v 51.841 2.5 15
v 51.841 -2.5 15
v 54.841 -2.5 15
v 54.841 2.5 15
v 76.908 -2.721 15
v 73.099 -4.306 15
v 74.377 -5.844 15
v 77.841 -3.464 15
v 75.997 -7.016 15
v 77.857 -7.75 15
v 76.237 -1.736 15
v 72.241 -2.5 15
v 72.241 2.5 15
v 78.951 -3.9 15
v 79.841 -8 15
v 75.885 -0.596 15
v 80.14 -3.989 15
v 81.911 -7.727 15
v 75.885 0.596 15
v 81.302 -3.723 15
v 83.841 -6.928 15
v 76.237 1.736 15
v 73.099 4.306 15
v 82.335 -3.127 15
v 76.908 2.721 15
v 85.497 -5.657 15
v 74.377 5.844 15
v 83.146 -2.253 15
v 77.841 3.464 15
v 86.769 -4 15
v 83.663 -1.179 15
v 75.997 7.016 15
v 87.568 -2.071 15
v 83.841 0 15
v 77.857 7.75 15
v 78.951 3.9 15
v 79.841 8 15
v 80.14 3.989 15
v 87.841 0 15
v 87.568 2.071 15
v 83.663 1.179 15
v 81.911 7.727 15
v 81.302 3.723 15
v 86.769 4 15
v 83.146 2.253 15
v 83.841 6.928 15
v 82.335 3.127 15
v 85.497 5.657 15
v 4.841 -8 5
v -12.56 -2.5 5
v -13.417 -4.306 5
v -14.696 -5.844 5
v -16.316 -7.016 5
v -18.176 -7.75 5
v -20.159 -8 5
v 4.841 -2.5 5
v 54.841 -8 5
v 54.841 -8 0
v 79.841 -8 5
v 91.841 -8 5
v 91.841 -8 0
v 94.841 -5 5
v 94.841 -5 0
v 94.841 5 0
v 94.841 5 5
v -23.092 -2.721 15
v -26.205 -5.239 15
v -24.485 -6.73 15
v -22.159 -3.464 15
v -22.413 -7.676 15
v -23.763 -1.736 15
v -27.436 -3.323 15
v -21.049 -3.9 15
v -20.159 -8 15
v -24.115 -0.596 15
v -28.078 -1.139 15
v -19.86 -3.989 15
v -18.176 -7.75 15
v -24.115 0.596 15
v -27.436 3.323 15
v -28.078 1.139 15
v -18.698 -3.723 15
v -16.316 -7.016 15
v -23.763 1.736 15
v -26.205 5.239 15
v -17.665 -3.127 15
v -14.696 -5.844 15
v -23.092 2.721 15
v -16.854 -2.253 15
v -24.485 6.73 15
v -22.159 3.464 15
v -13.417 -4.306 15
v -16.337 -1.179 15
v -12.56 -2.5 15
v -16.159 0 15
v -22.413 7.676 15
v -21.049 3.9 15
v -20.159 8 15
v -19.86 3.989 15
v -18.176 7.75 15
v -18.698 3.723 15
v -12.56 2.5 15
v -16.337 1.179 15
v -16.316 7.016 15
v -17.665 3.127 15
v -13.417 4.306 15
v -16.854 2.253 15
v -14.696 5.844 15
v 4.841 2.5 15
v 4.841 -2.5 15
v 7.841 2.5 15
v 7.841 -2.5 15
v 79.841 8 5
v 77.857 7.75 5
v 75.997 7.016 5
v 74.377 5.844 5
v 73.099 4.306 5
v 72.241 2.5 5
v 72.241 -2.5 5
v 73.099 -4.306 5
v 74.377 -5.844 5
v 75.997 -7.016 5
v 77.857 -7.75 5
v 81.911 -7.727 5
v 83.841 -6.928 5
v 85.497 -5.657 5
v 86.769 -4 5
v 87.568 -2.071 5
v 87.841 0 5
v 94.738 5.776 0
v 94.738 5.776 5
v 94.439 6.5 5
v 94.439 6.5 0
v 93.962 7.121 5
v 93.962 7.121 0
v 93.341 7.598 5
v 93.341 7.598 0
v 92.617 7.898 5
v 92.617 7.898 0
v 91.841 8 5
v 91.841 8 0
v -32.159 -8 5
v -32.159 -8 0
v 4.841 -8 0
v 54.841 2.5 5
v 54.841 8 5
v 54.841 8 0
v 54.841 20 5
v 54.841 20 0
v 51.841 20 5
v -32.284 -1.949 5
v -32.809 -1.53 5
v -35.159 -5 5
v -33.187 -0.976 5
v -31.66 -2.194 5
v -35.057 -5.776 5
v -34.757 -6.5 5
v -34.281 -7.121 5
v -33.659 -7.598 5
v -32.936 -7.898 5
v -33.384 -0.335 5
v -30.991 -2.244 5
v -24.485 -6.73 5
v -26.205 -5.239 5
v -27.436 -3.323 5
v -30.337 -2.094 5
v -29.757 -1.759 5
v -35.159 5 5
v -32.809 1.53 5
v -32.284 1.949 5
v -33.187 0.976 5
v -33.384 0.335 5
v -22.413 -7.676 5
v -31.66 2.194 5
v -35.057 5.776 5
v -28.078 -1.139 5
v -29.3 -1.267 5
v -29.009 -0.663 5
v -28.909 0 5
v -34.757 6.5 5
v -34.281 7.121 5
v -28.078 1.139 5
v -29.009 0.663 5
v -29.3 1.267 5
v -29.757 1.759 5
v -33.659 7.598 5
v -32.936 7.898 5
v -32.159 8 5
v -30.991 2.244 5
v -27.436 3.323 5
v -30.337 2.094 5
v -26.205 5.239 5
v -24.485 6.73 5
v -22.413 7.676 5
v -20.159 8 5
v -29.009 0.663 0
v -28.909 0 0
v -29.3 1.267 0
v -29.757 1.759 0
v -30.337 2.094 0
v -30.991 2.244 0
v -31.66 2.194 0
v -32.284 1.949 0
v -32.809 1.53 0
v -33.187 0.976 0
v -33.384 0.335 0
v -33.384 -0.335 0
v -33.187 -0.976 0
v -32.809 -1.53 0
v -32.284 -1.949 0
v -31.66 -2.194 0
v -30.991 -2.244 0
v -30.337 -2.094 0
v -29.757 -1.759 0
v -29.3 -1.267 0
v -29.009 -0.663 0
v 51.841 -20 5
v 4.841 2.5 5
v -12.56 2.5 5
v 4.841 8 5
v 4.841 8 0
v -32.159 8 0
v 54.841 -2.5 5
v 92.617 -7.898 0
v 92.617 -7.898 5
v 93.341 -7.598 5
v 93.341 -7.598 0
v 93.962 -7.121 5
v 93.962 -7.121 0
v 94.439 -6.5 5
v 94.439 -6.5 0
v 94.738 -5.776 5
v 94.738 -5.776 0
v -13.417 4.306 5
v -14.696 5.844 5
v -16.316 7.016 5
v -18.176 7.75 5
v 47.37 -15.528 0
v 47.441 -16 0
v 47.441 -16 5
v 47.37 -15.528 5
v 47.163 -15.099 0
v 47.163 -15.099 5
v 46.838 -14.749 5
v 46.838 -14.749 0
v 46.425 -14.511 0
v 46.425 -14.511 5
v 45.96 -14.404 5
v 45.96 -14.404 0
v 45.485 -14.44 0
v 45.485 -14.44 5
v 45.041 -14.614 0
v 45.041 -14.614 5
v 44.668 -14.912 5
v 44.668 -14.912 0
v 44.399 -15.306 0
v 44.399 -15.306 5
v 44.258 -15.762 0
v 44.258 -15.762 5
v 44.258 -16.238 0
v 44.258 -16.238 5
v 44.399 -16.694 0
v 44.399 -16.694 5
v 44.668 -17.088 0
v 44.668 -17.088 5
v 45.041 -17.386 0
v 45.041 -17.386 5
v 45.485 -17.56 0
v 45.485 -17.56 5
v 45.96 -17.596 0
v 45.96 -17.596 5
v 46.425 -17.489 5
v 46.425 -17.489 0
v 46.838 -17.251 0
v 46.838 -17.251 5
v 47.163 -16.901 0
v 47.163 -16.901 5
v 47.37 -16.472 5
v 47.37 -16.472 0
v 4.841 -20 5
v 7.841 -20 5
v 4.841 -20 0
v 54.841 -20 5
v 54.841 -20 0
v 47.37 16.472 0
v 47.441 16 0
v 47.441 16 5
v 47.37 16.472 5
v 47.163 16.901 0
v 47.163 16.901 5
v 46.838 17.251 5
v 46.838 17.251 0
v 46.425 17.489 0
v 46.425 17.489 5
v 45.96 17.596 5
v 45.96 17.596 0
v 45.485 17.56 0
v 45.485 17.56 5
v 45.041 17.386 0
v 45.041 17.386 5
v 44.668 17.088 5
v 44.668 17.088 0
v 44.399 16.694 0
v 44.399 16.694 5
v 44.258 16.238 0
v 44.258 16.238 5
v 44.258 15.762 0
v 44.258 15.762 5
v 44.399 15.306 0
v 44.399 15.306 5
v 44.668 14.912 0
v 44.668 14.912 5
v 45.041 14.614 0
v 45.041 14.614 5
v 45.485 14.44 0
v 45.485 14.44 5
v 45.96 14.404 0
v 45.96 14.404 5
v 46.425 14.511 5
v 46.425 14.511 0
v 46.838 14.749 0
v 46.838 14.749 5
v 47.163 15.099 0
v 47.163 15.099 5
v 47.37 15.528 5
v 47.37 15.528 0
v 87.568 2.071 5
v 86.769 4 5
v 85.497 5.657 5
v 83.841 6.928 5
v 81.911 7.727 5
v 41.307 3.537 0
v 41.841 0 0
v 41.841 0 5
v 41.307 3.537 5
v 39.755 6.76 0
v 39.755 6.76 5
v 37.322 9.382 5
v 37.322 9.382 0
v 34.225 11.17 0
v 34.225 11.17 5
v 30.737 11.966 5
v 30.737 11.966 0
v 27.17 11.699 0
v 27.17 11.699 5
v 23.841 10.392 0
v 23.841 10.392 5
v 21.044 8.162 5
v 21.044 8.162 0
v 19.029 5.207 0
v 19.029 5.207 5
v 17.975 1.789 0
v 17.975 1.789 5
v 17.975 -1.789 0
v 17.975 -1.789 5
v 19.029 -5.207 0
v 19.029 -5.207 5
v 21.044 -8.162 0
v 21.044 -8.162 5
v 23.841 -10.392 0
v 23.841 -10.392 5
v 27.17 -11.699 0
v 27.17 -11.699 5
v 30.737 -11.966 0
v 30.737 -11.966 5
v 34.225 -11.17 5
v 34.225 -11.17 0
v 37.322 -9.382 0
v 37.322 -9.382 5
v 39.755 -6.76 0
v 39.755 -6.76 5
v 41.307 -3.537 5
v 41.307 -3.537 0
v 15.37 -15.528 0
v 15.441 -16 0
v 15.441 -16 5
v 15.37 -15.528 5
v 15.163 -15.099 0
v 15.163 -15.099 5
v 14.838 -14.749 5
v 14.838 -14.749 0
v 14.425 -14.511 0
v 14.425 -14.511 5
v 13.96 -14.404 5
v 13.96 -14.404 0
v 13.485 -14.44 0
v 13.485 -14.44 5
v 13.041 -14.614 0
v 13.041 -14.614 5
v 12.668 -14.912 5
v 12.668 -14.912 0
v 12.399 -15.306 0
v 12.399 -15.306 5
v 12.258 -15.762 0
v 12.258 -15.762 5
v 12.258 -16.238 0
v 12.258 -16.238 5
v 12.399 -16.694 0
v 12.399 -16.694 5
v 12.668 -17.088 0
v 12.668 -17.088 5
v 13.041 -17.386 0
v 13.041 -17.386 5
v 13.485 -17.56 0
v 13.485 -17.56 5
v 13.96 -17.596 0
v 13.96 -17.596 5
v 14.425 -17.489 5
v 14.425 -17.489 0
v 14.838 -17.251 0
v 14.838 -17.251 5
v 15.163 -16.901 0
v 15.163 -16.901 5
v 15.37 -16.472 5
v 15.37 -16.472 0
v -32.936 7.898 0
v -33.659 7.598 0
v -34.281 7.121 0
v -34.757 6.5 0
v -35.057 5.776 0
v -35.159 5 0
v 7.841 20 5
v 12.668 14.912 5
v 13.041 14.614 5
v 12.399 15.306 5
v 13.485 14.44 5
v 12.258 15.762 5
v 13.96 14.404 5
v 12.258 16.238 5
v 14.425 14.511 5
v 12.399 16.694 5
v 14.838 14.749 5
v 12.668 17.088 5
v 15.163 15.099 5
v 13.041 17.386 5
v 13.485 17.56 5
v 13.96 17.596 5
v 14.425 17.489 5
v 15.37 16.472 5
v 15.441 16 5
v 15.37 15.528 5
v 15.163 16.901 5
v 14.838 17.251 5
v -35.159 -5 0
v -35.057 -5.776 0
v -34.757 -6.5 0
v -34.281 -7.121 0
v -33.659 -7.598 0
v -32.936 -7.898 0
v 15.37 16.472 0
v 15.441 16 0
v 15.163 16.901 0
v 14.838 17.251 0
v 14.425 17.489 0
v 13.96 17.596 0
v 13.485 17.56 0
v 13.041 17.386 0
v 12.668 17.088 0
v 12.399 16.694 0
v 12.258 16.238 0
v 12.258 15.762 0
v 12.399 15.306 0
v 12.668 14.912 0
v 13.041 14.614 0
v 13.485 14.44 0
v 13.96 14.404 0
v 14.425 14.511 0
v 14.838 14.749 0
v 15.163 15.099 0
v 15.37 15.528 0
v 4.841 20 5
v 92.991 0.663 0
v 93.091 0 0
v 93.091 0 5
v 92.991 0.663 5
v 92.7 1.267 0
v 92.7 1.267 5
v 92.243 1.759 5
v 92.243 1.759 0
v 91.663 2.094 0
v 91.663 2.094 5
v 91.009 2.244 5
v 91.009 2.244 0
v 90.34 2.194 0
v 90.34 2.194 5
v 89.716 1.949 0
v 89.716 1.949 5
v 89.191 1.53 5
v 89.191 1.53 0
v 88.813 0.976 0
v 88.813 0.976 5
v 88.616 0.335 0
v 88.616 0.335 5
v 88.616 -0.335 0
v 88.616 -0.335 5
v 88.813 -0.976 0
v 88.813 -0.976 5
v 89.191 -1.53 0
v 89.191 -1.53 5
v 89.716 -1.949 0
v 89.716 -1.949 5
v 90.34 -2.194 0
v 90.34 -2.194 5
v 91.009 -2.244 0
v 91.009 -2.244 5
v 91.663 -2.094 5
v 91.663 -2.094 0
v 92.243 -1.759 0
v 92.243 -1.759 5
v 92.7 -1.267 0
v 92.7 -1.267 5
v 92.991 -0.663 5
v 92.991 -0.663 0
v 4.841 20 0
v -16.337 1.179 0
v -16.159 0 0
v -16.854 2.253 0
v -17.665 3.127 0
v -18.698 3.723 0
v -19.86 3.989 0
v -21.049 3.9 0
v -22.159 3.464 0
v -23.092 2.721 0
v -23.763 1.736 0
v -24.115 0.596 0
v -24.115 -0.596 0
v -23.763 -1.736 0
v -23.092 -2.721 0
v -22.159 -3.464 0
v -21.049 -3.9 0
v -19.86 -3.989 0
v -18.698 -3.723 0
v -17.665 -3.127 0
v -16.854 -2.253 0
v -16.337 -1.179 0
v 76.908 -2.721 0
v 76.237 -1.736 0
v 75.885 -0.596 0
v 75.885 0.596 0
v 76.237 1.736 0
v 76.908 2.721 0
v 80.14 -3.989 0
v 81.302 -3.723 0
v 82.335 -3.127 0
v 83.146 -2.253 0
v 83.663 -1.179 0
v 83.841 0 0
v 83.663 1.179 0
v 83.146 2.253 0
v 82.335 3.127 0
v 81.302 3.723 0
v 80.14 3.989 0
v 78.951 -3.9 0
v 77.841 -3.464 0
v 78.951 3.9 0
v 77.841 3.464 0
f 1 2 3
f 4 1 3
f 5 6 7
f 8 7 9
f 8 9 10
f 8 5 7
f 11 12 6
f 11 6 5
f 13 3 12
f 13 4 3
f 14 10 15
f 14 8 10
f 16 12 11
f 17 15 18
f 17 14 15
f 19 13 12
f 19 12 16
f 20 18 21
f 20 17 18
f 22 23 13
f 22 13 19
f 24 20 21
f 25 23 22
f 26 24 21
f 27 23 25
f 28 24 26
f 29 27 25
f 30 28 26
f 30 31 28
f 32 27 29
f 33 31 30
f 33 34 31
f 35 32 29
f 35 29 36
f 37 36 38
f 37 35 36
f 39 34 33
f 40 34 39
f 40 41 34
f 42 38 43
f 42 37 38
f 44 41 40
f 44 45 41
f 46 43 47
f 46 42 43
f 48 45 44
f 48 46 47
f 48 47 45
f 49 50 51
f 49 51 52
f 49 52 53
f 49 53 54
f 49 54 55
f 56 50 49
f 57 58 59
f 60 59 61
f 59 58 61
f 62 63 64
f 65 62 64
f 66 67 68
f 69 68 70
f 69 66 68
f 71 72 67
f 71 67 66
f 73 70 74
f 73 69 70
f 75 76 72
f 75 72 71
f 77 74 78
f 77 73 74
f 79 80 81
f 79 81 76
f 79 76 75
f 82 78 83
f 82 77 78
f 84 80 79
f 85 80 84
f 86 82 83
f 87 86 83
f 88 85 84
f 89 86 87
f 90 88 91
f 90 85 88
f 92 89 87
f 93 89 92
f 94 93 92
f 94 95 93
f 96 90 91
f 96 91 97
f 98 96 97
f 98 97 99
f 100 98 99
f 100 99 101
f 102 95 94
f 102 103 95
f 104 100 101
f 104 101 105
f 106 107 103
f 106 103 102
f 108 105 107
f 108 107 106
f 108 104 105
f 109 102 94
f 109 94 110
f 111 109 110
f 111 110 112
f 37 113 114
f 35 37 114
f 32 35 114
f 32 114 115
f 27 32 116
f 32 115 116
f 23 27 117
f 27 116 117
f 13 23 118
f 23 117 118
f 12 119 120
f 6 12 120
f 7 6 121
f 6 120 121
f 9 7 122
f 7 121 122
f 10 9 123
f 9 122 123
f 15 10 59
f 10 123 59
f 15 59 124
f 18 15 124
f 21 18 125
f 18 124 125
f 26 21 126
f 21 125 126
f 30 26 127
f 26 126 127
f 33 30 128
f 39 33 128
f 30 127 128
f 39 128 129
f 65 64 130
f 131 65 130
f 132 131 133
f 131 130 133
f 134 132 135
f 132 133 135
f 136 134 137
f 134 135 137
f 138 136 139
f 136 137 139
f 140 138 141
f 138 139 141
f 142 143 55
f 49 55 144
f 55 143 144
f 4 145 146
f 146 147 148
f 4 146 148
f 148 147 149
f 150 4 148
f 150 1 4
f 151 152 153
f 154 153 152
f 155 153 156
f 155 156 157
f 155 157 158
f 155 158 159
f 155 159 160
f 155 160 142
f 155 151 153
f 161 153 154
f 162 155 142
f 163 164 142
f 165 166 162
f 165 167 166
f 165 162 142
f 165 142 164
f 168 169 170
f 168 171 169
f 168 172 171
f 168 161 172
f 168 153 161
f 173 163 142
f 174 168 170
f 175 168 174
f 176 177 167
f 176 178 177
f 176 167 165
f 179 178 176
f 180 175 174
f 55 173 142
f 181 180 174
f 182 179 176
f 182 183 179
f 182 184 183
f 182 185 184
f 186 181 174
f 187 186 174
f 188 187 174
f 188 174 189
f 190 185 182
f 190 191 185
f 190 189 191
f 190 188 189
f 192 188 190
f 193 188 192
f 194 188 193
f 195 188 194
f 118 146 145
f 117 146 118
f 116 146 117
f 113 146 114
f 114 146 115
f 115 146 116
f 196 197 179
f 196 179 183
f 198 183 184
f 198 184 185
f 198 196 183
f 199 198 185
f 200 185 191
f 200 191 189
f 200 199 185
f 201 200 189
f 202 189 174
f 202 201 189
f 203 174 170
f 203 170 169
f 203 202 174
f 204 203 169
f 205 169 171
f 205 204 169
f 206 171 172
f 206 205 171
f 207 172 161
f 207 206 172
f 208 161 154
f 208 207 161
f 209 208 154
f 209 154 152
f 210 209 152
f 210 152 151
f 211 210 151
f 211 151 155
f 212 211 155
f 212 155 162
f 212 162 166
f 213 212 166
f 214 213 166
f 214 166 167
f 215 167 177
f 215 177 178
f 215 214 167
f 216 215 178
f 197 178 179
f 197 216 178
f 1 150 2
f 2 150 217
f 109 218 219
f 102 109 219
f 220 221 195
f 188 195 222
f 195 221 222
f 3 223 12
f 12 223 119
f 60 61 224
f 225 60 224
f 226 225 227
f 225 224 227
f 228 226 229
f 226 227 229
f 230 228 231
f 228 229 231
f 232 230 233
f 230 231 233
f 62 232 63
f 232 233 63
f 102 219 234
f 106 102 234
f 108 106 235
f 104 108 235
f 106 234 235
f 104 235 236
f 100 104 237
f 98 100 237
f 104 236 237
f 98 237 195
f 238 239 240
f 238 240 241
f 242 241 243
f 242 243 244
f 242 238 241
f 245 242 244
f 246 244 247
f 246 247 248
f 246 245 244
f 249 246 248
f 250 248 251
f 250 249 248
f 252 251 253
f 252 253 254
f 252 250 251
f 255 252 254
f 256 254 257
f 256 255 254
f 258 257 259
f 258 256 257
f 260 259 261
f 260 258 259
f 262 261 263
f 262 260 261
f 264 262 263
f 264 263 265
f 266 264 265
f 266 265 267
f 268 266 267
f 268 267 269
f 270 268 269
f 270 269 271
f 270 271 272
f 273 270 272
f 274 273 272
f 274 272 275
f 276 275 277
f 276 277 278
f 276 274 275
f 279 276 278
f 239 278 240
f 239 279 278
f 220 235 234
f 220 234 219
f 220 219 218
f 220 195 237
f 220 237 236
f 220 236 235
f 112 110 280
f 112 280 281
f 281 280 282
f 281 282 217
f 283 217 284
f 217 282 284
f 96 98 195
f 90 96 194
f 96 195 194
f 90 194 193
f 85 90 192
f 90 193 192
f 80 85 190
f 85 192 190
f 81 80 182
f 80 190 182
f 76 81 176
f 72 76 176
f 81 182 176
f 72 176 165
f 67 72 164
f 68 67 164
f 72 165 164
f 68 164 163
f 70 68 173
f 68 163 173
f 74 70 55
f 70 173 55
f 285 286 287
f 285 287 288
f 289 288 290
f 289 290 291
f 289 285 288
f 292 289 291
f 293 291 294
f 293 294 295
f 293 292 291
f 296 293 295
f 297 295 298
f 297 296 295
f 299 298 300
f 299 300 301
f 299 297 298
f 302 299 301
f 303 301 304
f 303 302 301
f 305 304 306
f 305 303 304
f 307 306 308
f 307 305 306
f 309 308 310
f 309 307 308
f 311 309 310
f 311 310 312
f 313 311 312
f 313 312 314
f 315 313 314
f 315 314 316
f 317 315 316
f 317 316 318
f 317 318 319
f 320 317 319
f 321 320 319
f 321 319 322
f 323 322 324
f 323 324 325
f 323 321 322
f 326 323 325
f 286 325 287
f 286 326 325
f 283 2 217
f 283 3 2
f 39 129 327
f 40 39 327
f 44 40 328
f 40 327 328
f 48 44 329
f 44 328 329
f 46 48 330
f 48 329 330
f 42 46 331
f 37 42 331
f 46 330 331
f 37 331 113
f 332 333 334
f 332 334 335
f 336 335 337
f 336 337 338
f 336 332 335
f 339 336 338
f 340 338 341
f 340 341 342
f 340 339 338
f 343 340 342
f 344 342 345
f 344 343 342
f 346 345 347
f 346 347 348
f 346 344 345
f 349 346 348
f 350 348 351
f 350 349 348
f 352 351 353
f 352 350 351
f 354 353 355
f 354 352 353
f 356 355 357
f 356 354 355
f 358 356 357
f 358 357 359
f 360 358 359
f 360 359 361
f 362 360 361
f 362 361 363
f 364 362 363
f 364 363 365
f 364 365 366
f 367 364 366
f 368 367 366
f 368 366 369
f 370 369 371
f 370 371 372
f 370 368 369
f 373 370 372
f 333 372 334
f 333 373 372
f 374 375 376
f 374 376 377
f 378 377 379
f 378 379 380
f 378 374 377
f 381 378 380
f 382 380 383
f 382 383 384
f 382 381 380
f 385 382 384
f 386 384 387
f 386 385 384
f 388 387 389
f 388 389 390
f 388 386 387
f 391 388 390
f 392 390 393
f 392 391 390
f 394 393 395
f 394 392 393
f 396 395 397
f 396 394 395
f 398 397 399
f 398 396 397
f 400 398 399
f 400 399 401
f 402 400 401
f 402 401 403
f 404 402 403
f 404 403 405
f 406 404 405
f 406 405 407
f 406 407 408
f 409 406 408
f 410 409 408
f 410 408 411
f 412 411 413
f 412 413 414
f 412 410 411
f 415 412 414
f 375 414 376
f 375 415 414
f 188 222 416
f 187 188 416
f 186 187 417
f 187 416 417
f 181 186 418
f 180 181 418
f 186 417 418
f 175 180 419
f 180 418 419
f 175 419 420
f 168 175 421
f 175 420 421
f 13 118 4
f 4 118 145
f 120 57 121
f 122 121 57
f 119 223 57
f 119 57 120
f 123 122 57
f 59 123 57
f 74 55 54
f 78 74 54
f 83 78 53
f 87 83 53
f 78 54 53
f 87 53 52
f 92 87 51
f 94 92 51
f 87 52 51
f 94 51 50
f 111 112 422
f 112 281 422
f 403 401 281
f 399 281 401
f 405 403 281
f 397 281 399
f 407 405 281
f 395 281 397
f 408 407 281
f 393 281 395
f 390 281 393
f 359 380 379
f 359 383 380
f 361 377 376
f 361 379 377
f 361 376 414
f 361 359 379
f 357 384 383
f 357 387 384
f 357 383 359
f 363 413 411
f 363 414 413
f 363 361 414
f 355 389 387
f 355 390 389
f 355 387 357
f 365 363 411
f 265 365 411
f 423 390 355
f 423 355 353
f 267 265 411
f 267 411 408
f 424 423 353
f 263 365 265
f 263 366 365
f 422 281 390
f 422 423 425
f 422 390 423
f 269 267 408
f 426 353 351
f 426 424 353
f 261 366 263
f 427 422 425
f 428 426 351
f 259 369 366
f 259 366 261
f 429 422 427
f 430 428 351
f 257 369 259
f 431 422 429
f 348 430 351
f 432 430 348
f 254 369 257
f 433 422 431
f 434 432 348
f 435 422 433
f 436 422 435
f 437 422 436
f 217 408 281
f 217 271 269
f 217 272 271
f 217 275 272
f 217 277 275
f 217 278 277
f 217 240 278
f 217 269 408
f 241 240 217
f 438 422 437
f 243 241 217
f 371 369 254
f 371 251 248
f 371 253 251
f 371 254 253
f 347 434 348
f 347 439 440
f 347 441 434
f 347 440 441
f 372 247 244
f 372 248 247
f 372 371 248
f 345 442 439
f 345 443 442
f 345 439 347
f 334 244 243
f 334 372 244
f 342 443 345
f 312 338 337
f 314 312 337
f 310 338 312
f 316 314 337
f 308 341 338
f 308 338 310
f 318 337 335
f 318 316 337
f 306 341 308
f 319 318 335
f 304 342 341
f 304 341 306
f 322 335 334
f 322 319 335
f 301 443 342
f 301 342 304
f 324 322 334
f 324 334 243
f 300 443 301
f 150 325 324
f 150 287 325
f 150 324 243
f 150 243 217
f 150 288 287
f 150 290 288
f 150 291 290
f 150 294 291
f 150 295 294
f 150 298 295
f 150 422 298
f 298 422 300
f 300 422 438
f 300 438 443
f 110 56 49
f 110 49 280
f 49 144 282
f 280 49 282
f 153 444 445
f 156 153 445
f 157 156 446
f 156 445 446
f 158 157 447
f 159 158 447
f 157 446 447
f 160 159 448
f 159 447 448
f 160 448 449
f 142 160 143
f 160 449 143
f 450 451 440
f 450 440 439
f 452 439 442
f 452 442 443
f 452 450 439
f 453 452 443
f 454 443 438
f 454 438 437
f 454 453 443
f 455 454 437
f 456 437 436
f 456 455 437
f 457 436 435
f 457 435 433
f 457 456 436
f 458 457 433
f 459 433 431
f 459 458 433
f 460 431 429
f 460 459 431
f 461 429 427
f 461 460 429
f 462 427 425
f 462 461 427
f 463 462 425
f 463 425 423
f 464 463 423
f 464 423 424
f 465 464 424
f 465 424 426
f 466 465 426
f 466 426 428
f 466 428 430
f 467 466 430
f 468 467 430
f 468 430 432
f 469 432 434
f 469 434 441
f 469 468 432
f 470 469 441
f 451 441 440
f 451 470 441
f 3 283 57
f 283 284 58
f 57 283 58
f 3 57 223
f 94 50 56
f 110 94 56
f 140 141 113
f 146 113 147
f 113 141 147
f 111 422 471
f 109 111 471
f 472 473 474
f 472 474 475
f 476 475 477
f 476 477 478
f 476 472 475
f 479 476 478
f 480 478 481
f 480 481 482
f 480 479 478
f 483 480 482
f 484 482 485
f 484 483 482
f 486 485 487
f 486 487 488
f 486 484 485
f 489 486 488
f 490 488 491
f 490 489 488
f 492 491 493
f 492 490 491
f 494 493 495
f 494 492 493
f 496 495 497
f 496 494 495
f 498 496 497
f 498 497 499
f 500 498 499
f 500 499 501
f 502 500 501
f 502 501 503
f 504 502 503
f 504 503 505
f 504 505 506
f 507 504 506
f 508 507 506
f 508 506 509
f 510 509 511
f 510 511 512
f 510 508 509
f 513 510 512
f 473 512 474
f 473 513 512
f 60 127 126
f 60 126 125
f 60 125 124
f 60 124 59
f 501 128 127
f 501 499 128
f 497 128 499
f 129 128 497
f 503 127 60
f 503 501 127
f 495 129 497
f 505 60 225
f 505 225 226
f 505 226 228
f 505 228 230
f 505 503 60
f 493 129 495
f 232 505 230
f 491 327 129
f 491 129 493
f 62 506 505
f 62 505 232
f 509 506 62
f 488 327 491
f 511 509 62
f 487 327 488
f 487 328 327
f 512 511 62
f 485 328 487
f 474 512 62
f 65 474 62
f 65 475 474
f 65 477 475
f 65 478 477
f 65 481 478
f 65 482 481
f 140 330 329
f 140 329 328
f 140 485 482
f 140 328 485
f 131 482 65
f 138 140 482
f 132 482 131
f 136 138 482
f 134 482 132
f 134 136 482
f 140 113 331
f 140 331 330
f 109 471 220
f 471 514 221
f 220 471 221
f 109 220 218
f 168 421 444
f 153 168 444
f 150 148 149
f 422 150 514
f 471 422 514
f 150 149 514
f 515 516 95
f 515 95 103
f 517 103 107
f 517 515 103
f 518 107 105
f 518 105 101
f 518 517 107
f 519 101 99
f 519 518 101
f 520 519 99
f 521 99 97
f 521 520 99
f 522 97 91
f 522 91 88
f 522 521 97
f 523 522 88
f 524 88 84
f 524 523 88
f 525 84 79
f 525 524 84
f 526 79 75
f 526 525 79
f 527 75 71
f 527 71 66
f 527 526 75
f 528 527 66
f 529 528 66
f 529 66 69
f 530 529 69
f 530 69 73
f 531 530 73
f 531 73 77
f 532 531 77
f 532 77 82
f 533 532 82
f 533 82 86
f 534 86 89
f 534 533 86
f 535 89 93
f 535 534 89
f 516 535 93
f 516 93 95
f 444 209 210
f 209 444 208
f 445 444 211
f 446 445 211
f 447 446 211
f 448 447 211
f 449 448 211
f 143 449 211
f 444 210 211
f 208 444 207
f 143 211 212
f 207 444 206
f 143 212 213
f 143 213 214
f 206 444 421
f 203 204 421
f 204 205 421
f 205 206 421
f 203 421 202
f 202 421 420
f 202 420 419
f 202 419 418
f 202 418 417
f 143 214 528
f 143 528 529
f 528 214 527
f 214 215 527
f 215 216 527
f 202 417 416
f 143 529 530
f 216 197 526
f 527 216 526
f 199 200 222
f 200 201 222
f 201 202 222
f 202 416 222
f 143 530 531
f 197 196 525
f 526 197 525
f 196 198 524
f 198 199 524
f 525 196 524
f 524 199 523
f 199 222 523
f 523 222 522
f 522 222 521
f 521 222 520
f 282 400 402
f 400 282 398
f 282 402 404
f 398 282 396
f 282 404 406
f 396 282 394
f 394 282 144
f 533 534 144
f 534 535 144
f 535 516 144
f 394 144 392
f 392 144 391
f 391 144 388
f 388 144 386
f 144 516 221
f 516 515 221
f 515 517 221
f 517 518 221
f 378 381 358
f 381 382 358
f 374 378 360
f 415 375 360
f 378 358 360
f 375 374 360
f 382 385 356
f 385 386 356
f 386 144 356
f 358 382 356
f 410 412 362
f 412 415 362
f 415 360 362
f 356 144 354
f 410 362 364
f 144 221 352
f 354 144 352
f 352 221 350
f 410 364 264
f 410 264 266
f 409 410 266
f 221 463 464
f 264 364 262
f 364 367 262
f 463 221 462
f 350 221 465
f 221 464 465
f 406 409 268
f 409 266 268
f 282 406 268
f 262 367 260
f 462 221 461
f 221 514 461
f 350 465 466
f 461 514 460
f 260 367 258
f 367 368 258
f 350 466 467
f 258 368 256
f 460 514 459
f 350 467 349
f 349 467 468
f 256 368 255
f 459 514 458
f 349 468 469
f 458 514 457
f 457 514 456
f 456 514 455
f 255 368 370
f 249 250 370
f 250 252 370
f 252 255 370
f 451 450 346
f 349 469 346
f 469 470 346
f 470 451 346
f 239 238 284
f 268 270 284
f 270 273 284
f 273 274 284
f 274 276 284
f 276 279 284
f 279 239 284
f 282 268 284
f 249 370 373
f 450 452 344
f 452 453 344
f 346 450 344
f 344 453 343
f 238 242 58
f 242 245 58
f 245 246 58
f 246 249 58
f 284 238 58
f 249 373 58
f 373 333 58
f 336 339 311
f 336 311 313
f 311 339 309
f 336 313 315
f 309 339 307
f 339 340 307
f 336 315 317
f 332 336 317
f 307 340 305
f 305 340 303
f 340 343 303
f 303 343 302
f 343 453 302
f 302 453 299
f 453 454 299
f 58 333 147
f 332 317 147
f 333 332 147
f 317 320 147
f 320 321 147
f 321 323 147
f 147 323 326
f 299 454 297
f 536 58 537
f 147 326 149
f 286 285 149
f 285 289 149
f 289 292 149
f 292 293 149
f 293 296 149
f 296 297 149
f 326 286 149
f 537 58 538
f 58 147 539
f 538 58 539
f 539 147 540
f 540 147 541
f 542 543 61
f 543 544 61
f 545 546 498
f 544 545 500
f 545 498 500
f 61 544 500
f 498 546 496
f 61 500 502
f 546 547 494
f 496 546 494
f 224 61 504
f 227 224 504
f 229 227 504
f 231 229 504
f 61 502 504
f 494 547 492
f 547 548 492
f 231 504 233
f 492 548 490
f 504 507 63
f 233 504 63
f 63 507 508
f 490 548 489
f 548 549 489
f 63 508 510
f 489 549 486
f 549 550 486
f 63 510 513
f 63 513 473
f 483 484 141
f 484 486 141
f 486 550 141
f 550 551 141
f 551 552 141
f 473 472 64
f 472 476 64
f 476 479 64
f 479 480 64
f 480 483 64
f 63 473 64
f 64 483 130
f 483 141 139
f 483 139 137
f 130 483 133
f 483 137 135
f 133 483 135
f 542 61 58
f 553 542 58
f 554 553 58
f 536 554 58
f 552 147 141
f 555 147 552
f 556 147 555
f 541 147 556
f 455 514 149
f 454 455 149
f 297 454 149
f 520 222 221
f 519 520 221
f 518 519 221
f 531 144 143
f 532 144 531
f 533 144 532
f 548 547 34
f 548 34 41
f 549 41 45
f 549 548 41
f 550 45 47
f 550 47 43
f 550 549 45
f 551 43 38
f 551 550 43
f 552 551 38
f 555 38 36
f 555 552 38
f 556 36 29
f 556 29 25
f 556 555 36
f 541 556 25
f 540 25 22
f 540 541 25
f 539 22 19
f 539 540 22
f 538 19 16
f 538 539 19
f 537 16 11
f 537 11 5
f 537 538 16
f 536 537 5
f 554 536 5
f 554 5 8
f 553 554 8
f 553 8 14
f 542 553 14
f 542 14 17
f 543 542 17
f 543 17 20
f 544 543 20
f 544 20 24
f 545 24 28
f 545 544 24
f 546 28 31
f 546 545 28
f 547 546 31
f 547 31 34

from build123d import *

# Parameters (mm, degrees)
F1_DEPTH = 5
F0_R     = 2.25
F0_W     = 44
F0_H     = 40
F0_R_2   = 1.6
F0_R_3   = 12
F0_R_4   = 4
F2_DEPTH = 15
F3_SIZE2 = 10
F3_SIZE  = 17.5
F4_SIZE2 = 10
F4_SIZE  = 17.5


with BuildPart() as f1:
    # F0 (on Top) → F1 (new body)
    with BuildSketch(Plane.XY):
        with BuildLine():
            Line((4.8406173328, -2.5), (-12.5600405904, -2.5))
            ThreePointArc((-12.5600405904, -2.5), (-15.4689669073, -6.4807406984), (-20.1593826672, -8))
            Line((-20.1593826672, -8), (4.8406173328, -8))
            Line((4.8406173328, -8), (4.8406173328, -2.5))
        make_face()
    extrude(amount=F1_DEPTH)



with BuildPart() as f1b:
    # F0 (on Top) → F1, piece 2 (new body)
    with BuildSketch(Plane.XY):
        with BuildLine():
            ThreePointArc((-20.1593826672, 8), (-15.4689669073, 6.4807406984), (-12.5600405904, 2.5))
            Line((-12.5600405904, 2.5), (4.8406173328, 2.5))
            Line((4.8406173328, 2.5), (4.8406173328, 8))
            Line((4.8406173328, 8), (-20.1593826672, 8))
        make_face()
    extrude(amount=F1_DEPTH)


with BuildPart() as f1c:
    # F0 (on Top) → F1, piece 3 (new body)
    with BuildSketch(Plane.XY):
        with BuildLine():
            ThreePointArc((-20.1593826672, -8), (-28.1593826672, 0), (-20.1593826672, 8))
            Line((-20.1593826672, 8), (-32.1593826672, 8))
            ThreePointArc((-32.1593826672, 8), (-34.2807030107, 7.1213203436), (-35.1593826672, 5))
            Line((-35.1593826672, 5), (-35.1593826672, -5))
            ThreePointArc((-35.1593826672, -5), (-34.2807030107, -7.1213203436), (-32.1593826672, -8))
            Line((-32.1593826672, -8), (-20.1593826672, -8))
        make_face()
        with Locations((-31.1593826672, 0)):
            Circle(F0_R, mode=Mode.SUBTRACT)
    extrude(amount=F1_DEPTH)


with BuildPart() as f1d:
    # F0 (on Top) → F1, piece 4 (new body)
    with BuildSketch(Plane.XY):
        with BuildLine():
            Line((91.8406173328, 8), (79.8406173328, 8))
            ThreePointArc((79.8406173328, 8), (85.4974715823, 5.6568542495), (87.8406173328, 0))
            ThreePointArc((87.8406173328, 0), (85.4974715823, -5.6568542495), (79.8406173328, -8))
            Line((79.8406173328, -8), (91.8406173328, -8))
            ThreePointArc((91.8406173328, -8), (93.9619376764, -7.1213203436), (94.8406173328, -5))
            Line((94.8406173328, -5), (94.8406173328, 5))
            ThreePointArc((94.8406173328, 5), (93.9619376764, 7.1213203436), (91.8406173328, 8))
        make_face()
        with Locations((90.8406173328, 0)):
            Circle(F0_R, mode=Mode.SUBTRACT)
    extrude(amount=F1_DEPTH)


with BuildPart() as f1e:
    # F0 (on Top) → F1, piece 5 (new body)
    with BuildSketch(Plane.XY):
        with BuildLine():
            Line((54.8406173328, -2.5), (54.8406173328, -8))
            Line((54.8406173328, -8), (79.8406173328, -8))
            ThreePointArc((79.8406173328, -8), (75.150201573, -6.4807406984), (72.2412752561, -2.5))
            Line((72.2412752561, -2.5), (54.8406173328, -2.5))
        make_face()
    extrude(amount=F1_DEPTH)


with BuildPart() as f1f:
    # F0 (on Top) → F1, piece 6 (new body)
    with BuildSketch(Plane.XY):
        with BuildLine():
            Line((79.8406173328, 8), (54.8406173328, 8))
            Line((54.8406173328, 8), (54.8406173328, 2.5))
            Line((54.8406173328, 2.5), (72.2412752561, 2.5))
            ThreePointArc((72.2412752561, 2.5), (75.150201573, 6.4807406984), (79.8406173328, 8))
        make_face()
    extrude(amount=F1_DEPTH)


with BuildPart() as f1g:
    # F0 (on Top) → F1, piece 7 (new body)
    with BuildSketch(Plane.XY):
        with Locations((29.8406173328, 0)):
            Rectangle(F0_W, F0_H)
        with Locations((13.8406173328, -16)):
            Circle(F0_R_2, mode=Mode.SUBTRACT)
        with Locations((45.8406173328, -16)):
            Circle(F0_R_2, mode=Mode.SUBTRACT)
        with Locations((13.8406173328, 16)):
            Circle(F0_R_2, mode=Mode.SUBTRACT)
        with Locations((29.8406173328, 0)):
            Circle(F0_R_3, mode=Mode.SUBTRACT)
        with Locations((45.8406173328, 16)):
            Circle(F0_R_2, mode=Mode.SUBTRACT)
    extrude(amount=F1_DEPTH)


with BuildPart() as f1_1:
    add(f1.part)

    add(f1b.part)  # F2 merges F1b

    add(f1c.part)  # F2 merges F1c

    add(f1d.part)  # F2 merges F1d

    add(f1e.part)  # F2 merges F1e

    add(f1f.part)  # F2 merges F1f

    add(f1g.part)  # F2 merges F1g
    # F0 (on Top) → F2 (join)
    with BuildSketch(Plane.XY):
        with BuildLine():
            ThreePointArc((-12.5600405904, -2.5), (-12.2601821818, -1.2659509046), (-12.1593826672, 0))
            ThreePointArc((-12.1593826672, 0), (-12.2601821818, 1.2659509046), (-12.5600405904, 2.5))
            ThreePointArc((-12.5600405904, 2.5), (-15.4689669073, 6.4807406984), (-20.1593826672, 8))
            ThreePointArc((-20.1593826672, 8), (-28.1593826672, 0), (-20.1593826672, -8))
            ThreePointArc((-20.1593826672, -8), (-15.4689669073, -6.4807406984), (-12.5600405904, -2.5))
        make_face()
        with Locations((-20.1593826672, 0)):
            Circle(F0_R_4, mode=Mode.SUBTRACT)
        with BuildLine():
            ThreePointArc((87.8406173328, 0), (85.4974715823, 5.6568542495), (79.8406173328, 8))
            ThreePointArc((79.8406173328, 8), (75.150201573, 6.4807406984), (72.2412752561, 2.5))
            ThreePointArc((72.2412752561, 2.5), (71.8406173328, 0), (72.2412752561, -2.5))
            ThreePointArc((72.2412752561, -2.5), (75.150201573, -6.4807406984), (79.8406173328, -8))
            ThreePointArc((79.8406173328, -8), (85.4974715823, -5.6568542495), (87.8406173328, 0))
        make_face()
        with Locations((79.8406173328, 0)):
            Circle(F0_R_4, mode=Mode.SUBTRACT)
        with BuildLine():
            ThreePointArc((-12.5600405904, 2.5), (-12.2601821818, 1.2659509046), (-12.1593826672, 0))
            ThreePointArc((-12.1593826672, 0), (-12.2601821818, -1.2659509046), (-12.5600405904, -2.5))
            Line((-12.5600405904, -2.5), (4.8406173328, -2.5))
            Line((4.8406173328, -2.5), (4.8406173328, -8))
            Line((4.8406173328, -8), (4.8406173328, -20))
            Line((4.8406173328, -20), (7.8406173328, -20))
            Line((7.8406173328, -20), (7.8406173328, 20))
            Line((7.8406173328, 20), (4.8406173328, 20))
            Line((4.8406173328, 20), (4.8406173328, 8))
            Line((4.8406173328, 8), (4.8406173328, 2.5))
            Line((4.8406173328, 2.5), (-12.5600405904, 2.5))
        make_face()
        with BuildLine():
            Line((54.8406173328, 20), (51.8406173328, 20))
            Line((51.8406173328, 20), (51.8406173328, -20))
            Line((51.8406173328, -20), (54.8406173328, -20))
            Line((54.8406173328, -20), (54.8406173328, -8))
            Line((54.8406173328, -8), (54.8406173328, -2.5))
            Line((54.8406173328, -2.5), (72.2412752561, -2.5))
            ThreePointArc((72.2412752561, -2.5), (71.8406173328, 0), (72.2412752561, 2.5))
            Line((72.2412752561, 2.5), (54.8406173328, 2.5))
            Line((54.8406173328, 2.5), (54.8406173328, 8))
            Line((54.8406173328, 8), (54.8406173328, 20))
        make_face()
    extrude(amount=F2_DEPTH)

    # F3
    f3_edges = [f1_1.edges().sort_by_distance(p)[0] for p in [
        (6.340617, -20, 15),
        (6.340617, 20, 15),
    ]]
    f3_side = f1_1.faces().sort_by_distance((-7.289097, 0, 15))[0]
    chamfer(f3_edges, length=F3_SIZE, length2=F3_SIZE2, reference=f3_side)

    # F4
    f4_edges = [f1_1.edges().sort_by_distance(p)[0] for p in [
        (53.340617, -20, 15),
        (53.340617, 20, 15),
    ]]
    f4_side = f1_1.faces().sort_by_distance((66.970331, 0, 15))[0]
    chamfer(f4_edges, length=F4_SIZE, length2=F4_SIZE2, reference=f4_side)


solid = f1_1.part
